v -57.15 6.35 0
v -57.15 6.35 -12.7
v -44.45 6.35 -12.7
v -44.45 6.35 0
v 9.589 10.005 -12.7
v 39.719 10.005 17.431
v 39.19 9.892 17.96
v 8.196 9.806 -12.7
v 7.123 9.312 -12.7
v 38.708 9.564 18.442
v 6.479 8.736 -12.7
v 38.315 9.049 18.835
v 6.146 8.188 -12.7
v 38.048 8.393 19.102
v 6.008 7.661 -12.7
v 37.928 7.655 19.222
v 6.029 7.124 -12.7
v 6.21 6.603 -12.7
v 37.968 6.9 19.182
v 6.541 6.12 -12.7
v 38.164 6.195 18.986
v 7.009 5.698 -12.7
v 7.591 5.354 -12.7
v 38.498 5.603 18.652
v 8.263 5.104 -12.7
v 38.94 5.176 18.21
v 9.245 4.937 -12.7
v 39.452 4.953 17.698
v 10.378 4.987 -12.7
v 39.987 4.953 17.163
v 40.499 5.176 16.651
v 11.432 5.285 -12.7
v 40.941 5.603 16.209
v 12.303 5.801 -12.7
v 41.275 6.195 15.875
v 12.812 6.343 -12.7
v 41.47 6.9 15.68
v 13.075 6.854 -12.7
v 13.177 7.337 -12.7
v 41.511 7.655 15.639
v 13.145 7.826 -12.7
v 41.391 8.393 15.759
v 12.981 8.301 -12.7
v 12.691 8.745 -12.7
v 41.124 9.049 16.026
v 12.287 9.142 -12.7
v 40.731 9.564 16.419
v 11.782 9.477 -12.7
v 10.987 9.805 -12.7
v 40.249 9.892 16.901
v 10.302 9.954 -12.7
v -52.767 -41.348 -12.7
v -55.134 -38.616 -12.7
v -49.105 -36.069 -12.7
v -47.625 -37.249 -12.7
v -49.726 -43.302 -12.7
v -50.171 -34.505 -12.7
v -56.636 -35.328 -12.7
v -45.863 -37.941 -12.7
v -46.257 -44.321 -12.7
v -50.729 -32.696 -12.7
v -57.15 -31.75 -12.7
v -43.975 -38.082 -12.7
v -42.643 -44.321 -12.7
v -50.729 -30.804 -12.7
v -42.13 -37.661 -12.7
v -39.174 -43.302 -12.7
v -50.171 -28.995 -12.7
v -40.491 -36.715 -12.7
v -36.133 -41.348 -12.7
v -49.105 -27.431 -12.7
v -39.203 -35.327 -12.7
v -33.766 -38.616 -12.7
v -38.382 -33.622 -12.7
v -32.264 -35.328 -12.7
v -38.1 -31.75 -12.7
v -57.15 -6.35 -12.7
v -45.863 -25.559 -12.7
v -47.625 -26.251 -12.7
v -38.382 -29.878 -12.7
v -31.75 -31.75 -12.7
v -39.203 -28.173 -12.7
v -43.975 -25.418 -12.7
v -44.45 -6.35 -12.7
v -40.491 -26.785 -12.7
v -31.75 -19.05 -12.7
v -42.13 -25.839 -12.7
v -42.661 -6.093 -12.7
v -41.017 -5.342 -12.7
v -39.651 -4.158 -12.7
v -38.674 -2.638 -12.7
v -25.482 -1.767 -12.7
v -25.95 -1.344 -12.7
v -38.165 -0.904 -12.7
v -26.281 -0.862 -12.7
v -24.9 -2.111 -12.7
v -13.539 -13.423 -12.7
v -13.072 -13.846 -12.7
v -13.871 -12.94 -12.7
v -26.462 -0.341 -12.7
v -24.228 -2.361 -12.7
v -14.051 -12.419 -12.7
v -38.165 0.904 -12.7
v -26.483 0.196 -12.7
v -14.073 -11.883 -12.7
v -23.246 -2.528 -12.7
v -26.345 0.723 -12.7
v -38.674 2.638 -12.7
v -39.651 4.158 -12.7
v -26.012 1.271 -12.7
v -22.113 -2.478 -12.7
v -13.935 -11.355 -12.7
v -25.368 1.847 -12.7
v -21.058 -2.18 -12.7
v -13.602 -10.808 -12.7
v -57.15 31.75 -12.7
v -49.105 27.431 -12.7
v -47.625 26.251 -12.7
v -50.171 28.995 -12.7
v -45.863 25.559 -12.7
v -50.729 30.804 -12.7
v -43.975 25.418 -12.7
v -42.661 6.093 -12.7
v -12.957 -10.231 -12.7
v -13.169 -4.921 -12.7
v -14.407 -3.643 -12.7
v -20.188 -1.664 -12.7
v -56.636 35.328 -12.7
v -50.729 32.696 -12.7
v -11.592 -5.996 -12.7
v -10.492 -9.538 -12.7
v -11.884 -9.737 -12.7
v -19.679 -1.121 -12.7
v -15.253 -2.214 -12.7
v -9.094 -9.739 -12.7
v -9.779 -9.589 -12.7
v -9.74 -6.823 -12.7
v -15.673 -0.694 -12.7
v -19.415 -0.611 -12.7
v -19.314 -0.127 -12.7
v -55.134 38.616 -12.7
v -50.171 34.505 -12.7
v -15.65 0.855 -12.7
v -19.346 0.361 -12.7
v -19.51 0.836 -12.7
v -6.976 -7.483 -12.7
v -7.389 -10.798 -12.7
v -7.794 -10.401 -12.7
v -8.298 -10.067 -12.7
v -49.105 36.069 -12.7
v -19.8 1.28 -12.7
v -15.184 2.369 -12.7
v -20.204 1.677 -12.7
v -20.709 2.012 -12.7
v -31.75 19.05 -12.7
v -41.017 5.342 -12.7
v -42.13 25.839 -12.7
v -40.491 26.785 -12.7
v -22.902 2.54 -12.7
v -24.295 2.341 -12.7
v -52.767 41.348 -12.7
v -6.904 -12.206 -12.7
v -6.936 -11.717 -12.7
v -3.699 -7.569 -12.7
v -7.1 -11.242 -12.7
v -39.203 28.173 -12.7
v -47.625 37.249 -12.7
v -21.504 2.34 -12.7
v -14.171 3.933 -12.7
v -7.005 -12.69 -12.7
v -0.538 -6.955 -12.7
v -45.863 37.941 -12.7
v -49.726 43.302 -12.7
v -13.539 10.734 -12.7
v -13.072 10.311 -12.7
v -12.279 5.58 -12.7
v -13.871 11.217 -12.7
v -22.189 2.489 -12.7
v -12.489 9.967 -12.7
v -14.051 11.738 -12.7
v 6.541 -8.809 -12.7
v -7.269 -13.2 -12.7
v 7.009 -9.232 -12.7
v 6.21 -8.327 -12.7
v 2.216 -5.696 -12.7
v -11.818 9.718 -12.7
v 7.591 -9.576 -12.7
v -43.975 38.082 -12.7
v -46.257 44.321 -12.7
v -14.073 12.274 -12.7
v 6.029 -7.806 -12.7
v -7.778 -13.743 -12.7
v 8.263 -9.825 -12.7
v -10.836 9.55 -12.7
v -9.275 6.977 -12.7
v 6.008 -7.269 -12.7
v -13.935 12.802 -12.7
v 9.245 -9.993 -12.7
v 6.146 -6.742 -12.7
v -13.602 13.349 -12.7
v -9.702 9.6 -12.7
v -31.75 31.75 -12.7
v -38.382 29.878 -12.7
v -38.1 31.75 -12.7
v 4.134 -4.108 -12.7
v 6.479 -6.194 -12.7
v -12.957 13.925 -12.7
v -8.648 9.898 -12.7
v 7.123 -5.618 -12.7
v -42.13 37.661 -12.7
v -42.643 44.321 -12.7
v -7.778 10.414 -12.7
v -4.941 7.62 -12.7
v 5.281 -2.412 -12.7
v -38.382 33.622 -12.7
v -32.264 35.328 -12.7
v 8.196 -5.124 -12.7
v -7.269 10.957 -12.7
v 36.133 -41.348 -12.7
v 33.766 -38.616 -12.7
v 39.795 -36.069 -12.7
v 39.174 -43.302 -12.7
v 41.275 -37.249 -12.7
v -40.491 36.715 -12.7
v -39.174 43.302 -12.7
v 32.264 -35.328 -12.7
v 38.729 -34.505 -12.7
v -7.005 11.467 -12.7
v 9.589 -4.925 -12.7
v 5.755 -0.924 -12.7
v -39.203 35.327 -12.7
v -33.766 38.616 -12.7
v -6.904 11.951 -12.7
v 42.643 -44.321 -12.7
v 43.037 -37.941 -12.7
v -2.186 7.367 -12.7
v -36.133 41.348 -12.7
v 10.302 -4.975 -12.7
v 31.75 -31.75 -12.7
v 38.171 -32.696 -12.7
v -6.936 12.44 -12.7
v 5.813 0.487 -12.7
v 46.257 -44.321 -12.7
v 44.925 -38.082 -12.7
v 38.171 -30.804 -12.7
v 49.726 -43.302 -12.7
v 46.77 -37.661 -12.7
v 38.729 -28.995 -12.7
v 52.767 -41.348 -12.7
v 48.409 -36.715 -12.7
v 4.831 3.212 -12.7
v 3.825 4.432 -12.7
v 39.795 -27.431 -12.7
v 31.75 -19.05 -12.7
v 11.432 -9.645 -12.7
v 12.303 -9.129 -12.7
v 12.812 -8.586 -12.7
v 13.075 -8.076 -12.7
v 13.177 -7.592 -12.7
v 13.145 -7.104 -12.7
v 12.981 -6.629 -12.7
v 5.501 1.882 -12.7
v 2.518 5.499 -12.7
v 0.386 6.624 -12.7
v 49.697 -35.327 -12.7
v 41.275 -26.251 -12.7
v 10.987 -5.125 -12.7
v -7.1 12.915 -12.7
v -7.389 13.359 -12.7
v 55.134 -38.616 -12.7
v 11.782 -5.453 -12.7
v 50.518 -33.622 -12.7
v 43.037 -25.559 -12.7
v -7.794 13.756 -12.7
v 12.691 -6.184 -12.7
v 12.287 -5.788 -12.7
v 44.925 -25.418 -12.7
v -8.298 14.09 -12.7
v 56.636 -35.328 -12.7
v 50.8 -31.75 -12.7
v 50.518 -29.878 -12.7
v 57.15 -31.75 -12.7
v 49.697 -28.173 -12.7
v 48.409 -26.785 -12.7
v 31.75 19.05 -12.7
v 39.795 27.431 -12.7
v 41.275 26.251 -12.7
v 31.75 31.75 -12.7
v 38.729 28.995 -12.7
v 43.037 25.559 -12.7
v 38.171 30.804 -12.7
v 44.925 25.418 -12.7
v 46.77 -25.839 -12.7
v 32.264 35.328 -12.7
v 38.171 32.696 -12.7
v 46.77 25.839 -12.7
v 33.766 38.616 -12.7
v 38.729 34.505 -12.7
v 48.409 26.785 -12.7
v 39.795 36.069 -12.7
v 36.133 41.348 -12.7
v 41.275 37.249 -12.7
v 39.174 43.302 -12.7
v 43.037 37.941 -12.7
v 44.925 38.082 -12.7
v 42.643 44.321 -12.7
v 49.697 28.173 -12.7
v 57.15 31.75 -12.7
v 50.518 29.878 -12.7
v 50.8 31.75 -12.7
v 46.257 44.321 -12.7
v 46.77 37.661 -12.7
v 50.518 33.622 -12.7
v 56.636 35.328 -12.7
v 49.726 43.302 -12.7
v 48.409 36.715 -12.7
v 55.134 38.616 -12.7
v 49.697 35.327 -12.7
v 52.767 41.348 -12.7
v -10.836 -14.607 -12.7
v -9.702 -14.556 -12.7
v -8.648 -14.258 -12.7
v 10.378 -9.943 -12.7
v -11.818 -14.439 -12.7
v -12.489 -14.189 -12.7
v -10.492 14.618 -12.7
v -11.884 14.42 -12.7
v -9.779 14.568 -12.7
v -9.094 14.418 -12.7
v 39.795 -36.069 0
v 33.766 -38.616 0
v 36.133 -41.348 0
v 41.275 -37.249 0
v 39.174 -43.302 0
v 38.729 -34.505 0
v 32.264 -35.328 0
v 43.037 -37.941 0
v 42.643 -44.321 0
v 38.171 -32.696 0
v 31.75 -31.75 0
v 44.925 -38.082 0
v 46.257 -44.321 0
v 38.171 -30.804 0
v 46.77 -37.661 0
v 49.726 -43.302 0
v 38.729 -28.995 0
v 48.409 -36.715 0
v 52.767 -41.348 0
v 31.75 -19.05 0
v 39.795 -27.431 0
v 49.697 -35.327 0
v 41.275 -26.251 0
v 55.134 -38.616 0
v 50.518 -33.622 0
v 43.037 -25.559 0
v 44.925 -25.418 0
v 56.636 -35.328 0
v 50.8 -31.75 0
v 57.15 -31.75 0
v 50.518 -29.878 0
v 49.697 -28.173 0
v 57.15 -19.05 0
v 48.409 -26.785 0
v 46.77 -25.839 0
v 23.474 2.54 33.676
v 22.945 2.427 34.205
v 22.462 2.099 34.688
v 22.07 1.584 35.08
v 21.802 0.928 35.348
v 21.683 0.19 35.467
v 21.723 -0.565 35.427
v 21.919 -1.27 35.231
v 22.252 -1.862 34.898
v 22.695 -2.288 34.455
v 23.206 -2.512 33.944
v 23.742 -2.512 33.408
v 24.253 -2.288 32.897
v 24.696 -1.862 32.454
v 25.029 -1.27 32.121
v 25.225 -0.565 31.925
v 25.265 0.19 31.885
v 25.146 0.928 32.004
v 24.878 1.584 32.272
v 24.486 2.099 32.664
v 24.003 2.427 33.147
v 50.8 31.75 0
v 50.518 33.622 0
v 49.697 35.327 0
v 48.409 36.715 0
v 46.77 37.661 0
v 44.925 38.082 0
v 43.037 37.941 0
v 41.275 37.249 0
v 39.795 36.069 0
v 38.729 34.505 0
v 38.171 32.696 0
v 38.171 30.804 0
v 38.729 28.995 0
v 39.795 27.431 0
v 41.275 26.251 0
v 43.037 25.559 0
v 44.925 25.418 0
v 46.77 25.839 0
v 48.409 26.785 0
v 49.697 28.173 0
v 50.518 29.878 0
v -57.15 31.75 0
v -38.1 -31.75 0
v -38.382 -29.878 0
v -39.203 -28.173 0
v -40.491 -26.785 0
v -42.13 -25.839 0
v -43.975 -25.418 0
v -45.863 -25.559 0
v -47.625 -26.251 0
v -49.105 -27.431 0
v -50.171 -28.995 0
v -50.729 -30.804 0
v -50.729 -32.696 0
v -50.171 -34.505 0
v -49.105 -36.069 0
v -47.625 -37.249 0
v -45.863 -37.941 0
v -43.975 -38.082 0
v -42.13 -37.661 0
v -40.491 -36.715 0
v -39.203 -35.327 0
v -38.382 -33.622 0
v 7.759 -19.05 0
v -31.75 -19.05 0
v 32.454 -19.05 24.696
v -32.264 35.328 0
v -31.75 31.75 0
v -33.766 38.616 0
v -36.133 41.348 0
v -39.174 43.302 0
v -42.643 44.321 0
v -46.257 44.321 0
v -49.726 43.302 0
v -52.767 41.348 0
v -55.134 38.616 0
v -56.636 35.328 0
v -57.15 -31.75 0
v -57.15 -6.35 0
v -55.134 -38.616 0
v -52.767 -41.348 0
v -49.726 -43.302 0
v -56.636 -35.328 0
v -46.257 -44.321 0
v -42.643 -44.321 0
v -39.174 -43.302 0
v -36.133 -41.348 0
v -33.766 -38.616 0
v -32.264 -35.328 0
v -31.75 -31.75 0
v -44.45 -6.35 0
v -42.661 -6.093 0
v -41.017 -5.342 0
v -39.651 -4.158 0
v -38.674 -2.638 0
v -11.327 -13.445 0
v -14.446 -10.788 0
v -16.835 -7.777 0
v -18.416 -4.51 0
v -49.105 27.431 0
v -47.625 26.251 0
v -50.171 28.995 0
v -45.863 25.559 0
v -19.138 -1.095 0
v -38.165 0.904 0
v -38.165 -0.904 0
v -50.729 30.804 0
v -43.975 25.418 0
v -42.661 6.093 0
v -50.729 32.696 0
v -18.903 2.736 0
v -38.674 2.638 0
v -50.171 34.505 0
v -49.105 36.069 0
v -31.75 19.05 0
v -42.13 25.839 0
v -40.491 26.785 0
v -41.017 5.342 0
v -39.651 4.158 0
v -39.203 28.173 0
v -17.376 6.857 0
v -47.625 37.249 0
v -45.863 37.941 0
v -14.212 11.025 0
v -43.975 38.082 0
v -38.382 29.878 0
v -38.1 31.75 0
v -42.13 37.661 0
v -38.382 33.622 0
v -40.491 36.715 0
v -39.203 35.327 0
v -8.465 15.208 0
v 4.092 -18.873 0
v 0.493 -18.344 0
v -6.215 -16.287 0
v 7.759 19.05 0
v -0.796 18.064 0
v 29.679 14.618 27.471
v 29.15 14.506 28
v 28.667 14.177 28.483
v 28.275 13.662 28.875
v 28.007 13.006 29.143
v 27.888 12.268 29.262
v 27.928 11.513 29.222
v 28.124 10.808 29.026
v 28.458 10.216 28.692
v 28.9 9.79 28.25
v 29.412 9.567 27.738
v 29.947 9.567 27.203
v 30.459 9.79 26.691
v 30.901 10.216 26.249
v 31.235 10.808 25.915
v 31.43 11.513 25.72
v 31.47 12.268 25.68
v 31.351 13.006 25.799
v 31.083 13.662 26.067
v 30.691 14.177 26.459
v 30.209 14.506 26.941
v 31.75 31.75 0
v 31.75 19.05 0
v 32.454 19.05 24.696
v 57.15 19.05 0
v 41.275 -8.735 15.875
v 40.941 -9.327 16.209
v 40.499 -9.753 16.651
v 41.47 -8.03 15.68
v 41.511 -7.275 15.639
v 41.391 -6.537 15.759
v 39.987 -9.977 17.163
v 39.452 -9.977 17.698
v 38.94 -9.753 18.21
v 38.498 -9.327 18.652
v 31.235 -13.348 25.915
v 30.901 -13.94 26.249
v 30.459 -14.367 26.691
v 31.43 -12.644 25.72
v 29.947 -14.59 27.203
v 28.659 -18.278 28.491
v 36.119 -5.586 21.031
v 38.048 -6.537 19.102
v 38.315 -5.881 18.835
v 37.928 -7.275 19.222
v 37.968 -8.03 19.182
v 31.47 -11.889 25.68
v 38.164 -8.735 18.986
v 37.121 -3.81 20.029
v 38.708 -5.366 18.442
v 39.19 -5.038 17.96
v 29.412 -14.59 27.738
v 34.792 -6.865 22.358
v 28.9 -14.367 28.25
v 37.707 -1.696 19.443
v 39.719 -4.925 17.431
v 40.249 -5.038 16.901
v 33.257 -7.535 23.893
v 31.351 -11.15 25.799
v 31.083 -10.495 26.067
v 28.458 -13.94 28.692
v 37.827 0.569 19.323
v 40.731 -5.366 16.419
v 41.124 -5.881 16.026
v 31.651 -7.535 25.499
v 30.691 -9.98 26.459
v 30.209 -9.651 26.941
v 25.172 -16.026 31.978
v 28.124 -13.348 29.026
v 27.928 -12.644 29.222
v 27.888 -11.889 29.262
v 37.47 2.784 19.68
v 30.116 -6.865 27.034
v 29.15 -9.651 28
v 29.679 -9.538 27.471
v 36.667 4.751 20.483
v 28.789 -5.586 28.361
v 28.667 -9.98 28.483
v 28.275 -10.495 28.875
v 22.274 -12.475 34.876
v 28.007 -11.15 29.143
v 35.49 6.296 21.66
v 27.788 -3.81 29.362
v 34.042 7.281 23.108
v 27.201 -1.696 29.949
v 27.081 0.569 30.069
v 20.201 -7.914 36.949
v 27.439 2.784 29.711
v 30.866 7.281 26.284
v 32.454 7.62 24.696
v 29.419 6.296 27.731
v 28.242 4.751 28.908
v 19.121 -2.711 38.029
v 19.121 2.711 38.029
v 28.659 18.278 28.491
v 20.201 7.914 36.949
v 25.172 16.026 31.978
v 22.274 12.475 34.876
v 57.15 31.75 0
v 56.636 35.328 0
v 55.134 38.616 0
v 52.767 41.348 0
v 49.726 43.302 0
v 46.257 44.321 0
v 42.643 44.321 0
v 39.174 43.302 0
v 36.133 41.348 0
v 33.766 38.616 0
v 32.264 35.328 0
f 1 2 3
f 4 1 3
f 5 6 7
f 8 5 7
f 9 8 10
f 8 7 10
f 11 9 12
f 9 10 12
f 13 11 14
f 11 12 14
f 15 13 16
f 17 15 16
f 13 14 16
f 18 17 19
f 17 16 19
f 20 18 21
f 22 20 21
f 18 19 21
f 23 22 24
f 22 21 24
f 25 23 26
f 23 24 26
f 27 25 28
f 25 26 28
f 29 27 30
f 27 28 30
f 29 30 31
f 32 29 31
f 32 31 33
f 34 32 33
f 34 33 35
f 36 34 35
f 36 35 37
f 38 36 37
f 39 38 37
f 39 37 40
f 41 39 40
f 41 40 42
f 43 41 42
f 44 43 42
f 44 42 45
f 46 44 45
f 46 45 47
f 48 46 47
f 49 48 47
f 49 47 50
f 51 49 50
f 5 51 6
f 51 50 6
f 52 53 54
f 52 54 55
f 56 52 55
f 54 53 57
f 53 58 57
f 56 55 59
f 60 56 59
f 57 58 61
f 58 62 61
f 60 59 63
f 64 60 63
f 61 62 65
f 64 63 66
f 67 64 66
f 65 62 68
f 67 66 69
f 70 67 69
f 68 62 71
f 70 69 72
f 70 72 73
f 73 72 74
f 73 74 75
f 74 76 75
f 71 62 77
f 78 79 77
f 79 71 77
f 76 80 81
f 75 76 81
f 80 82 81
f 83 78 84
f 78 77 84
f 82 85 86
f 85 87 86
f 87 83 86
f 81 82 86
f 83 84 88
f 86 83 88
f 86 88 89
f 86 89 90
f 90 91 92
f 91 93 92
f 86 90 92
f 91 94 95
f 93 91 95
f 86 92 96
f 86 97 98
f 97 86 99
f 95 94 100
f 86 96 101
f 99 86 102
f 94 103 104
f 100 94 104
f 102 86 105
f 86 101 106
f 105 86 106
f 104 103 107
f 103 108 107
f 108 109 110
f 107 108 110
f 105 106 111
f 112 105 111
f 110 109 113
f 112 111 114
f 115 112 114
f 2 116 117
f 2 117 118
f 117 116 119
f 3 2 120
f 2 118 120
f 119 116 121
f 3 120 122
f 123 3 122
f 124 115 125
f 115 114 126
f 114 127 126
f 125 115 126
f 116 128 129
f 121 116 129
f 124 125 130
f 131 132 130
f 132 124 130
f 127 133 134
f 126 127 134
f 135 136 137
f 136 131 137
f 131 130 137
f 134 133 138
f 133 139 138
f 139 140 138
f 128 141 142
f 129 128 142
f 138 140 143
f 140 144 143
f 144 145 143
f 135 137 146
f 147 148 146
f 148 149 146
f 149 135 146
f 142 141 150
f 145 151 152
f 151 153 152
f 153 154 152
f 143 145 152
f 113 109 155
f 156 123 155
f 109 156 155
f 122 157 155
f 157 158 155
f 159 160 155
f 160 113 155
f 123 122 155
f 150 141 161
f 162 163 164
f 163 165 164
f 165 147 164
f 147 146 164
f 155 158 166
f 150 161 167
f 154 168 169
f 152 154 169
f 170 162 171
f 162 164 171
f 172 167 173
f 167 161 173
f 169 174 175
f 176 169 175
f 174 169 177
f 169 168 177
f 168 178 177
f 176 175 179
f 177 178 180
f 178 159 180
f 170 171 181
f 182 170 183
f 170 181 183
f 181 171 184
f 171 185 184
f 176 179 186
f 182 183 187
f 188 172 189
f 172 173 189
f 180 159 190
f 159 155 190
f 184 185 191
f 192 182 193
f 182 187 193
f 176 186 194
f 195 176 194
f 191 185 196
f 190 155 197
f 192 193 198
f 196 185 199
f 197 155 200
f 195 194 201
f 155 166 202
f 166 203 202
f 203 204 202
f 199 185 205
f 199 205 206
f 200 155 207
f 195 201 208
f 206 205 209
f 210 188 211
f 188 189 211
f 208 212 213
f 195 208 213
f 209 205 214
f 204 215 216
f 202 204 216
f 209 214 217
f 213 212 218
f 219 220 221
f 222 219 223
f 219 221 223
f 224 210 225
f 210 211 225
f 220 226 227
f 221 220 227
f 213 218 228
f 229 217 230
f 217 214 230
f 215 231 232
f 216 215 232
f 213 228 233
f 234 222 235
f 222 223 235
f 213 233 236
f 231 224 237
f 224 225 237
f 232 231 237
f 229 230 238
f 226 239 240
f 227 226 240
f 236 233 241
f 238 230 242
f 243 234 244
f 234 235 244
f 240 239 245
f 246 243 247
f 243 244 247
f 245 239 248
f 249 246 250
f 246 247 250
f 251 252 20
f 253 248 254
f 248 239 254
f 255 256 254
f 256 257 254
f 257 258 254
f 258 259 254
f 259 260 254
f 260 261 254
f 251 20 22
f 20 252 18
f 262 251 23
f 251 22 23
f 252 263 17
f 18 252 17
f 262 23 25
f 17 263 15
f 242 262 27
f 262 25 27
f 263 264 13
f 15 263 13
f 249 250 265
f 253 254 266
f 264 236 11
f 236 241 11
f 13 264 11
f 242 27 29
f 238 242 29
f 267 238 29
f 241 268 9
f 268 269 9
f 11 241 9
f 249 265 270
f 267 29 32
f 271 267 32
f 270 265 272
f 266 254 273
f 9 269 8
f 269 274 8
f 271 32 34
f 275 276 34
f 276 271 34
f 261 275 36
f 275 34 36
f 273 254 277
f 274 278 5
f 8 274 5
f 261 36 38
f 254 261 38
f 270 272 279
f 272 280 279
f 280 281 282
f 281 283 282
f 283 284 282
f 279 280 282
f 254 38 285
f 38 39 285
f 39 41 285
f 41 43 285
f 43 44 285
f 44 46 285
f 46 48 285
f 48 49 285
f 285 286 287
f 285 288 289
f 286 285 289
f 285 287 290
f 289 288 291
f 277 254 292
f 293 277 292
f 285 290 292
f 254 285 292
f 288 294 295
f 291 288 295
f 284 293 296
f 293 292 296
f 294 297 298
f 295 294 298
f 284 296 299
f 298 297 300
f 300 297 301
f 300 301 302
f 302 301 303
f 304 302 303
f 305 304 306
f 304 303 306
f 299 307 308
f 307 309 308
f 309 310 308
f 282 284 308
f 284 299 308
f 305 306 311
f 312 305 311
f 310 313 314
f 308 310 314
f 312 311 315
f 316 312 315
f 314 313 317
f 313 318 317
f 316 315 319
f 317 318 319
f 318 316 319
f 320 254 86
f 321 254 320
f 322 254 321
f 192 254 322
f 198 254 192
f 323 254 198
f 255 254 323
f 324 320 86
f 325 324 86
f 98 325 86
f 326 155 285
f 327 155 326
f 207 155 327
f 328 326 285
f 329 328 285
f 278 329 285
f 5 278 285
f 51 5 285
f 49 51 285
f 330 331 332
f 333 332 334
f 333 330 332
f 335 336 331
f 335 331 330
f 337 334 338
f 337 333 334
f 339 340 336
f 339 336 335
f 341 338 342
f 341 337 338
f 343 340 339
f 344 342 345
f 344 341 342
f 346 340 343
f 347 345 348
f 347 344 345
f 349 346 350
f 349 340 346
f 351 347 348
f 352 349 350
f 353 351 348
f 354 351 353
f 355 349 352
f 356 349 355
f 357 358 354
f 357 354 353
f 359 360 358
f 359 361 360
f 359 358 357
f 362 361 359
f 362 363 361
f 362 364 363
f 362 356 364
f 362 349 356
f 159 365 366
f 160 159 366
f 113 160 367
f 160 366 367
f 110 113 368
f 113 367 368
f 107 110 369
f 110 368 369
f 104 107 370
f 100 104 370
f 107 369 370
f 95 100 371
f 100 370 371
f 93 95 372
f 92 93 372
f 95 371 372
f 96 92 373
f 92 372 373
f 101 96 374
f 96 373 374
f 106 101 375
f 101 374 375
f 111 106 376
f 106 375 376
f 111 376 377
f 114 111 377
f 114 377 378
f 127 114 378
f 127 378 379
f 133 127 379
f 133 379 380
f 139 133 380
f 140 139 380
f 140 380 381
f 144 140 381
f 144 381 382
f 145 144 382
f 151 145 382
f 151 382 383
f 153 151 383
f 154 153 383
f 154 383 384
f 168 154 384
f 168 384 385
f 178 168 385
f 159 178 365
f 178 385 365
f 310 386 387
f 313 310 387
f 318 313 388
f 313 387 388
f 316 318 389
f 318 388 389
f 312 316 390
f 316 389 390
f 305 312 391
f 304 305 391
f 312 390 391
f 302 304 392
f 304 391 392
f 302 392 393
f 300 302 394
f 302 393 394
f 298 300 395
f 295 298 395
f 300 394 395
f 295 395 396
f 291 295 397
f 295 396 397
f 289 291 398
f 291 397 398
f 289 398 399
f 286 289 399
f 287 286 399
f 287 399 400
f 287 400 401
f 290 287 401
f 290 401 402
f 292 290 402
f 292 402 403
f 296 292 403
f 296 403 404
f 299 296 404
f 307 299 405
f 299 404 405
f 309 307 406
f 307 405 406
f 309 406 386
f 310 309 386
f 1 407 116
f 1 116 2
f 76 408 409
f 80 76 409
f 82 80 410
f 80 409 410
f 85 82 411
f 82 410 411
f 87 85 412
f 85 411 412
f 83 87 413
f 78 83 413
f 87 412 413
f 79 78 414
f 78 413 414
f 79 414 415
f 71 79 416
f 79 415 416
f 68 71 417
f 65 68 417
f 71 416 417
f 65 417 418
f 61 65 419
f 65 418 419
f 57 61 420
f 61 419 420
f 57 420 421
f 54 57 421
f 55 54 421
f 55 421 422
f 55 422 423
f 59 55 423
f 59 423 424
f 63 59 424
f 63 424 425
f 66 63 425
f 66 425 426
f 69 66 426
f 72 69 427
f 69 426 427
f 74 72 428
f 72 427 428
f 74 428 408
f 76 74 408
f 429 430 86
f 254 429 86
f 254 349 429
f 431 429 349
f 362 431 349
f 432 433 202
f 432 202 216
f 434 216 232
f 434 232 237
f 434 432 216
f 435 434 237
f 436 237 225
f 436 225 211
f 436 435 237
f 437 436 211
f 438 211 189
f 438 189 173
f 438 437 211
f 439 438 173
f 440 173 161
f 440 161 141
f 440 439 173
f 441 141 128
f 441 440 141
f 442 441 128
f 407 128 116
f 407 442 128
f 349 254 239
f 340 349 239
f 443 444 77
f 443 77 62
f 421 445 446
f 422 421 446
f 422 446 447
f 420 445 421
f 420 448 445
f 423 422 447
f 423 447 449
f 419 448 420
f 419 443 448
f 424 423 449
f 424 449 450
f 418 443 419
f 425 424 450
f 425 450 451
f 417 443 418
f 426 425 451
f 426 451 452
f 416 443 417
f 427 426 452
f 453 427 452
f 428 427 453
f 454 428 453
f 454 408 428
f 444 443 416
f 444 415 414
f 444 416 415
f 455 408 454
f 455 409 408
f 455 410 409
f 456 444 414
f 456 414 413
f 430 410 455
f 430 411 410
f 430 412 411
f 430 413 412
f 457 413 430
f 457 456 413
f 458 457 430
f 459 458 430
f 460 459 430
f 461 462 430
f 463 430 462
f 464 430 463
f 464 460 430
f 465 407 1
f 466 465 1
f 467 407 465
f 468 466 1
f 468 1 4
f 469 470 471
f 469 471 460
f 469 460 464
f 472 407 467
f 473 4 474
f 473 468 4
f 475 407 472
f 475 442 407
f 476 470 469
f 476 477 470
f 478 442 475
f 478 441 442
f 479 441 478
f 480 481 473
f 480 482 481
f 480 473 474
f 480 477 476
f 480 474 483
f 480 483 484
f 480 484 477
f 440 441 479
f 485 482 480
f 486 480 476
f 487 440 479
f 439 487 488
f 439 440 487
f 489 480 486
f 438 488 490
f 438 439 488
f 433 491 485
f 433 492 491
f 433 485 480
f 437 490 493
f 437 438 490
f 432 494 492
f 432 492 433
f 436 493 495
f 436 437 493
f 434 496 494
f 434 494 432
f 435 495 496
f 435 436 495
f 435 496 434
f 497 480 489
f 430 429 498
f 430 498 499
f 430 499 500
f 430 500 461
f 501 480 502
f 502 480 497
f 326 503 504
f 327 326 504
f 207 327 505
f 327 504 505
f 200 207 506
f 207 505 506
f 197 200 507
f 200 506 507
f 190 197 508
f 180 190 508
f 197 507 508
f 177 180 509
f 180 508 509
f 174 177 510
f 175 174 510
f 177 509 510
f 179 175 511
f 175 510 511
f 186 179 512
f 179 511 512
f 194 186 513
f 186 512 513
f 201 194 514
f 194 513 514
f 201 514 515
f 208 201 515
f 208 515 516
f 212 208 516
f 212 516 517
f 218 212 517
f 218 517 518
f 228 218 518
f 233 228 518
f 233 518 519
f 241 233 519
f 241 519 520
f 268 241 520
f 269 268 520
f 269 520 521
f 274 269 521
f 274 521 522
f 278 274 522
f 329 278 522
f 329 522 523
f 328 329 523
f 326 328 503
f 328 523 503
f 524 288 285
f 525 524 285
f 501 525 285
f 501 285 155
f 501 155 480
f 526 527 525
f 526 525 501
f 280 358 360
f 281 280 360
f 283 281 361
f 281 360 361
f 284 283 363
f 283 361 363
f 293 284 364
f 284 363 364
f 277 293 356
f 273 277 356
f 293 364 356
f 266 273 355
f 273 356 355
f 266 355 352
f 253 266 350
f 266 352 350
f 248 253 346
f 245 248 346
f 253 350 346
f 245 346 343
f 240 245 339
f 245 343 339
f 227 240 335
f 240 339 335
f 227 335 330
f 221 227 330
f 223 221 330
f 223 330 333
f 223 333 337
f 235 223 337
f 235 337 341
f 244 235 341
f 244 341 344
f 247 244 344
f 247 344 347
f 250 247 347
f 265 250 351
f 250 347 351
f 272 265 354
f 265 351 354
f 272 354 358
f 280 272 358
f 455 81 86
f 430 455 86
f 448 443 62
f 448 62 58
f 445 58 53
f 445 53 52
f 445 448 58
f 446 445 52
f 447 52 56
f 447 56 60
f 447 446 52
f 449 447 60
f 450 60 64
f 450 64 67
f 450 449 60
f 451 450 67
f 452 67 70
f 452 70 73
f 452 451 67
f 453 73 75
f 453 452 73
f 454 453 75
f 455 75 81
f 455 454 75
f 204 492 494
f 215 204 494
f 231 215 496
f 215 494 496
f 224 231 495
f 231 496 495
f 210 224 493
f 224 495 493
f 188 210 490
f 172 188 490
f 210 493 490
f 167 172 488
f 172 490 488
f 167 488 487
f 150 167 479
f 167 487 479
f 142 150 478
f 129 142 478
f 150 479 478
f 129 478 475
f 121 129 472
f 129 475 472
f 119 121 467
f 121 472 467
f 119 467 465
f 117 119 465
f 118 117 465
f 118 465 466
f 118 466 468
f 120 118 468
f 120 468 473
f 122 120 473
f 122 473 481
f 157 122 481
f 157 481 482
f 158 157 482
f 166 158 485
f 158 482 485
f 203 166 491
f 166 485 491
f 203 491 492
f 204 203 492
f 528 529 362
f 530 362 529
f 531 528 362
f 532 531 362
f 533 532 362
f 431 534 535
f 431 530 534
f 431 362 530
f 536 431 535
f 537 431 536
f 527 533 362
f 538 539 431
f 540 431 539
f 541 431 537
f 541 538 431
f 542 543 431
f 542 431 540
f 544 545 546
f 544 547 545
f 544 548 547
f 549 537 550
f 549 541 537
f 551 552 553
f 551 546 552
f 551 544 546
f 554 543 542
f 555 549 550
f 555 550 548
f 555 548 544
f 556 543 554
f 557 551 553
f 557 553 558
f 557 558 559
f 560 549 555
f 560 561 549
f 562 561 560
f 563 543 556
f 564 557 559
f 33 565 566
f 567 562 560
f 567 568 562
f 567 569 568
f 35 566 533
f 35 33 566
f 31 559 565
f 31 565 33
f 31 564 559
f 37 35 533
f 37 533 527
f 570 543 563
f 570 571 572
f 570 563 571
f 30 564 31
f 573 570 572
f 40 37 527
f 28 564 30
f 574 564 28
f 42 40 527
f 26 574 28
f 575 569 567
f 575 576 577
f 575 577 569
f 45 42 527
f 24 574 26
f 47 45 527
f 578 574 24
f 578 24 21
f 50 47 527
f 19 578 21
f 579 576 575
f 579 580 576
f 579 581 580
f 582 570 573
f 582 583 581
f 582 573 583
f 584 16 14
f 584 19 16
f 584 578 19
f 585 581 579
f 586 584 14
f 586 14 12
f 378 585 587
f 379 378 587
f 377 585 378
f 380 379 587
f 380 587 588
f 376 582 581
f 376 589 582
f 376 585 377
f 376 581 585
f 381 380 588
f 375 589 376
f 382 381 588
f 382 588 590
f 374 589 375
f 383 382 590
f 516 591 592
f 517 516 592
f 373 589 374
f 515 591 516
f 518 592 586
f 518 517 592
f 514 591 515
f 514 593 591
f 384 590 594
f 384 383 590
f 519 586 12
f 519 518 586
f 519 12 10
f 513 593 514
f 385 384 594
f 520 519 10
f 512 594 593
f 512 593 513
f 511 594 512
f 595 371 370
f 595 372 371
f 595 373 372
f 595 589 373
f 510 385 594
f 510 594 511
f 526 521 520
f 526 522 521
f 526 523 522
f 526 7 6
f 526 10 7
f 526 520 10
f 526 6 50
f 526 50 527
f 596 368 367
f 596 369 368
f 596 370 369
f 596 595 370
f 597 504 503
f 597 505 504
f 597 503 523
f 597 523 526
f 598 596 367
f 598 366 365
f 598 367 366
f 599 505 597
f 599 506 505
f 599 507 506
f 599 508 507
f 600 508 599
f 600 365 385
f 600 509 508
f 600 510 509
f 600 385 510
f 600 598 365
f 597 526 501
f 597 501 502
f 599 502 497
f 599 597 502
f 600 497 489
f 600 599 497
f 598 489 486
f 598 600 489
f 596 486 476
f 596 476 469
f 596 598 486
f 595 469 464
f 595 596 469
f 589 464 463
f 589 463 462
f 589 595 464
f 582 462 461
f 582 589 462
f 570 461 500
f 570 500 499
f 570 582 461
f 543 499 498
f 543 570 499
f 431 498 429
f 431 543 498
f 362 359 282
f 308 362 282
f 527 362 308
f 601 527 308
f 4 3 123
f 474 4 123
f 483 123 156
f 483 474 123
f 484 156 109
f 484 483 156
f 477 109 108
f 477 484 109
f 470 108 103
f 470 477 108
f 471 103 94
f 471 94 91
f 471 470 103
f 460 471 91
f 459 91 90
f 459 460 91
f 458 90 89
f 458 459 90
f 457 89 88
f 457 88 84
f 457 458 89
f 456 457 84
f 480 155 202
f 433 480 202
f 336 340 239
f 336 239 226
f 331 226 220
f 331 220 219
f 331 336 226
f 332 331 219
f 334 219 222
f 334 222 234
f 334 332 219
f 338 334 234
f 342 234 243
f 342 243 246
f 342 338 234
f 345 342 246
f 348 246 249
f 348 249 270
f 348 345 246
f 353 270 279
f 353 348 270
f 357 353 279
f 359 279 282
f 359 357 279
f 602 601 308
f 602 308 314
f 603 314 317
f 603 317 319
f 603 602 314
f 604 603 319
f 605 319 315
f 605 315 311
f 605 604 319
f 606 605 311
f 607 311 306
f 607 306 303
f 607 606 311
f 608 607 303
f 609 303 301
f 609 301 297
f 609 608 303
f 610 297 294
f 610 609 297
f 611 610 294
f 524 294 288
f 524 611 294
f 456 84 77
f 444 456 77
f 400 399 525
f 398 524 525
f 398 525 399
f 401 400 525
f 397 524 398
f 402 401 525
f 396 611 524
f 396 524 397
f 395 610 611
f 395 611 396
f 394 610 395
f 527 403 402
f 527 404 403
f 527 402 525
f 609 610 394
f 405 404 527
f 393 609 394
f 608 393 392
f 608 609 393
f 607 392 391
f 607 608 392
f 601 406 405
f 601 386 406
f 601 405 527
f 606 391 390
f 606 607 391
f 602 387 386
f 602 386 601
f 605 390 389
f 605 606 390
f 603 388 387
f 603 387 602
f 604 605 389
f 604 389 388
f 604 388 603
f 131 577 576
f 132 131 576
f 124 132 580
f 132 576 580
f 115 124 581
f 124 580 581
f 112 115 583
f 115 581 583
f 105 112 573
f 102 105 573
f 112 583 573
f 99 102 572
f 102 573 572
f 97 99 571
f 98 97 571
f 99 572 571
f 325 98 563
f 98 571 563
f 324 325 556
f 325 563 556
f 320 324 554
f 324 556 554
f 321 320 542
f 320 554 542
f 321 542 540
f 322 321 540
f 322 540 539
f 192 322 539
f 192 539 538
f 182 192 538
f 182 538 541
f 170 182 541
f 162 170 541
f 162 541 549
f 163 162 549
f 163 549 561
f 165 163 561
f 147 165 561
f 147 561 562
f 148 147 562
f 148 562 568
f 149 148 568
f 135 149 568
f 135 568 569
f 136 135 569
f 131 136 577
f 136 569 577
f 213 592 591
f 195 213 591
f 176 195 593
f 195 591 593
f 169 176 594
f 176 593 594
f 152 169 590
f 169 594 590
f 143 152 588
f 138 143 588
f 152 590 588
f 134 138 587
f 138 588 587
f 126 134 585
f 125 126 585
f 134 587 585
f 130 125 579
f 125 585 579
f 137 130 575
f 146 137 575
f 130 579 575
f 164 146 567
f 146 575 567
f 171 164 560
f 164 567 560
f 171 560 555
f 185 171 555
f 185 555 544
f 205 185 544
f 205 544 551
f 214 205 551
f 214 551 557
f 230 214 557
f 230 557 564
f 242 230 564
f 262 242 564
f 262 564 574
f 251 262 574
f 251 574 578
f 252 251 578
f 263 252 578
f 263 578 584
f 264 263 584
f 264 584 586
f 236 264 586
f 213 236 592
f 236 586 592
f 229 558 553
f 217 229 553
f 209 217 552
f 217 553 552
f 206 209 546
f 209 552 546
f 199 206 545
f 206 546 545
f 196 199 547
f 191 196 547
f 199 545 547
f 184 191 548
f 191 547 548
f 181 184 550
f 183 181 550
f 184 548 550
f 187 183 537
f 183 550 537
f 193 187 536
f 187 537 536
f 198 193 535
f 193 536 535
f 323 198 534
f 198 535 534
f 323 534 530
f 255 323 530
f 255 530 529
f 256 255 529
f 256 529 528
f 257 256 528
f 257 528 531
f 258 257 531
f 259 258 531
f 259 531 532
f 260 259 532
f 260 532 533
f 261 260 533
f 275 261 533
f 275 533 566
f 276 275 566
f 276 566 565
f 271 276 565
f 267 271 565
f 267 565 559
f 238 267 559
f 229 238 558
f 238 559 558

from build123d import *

# Parameters (mm, degrees)
F0_R     = 6.35
F1_DEPTH = 12.7
F3_R     = 2.54
F3_R_2   = 7.62
F5_DEPTH = 89.8035612107


with BuildPart() as f1:
    # F0 (on Top) → F1 (new body)
    with BuildSketch(Plane.XY):
        with BuildLine():
            Line((-31.75, -19.05), (0, -19.05))
            Line((0, -19.05), (0, 19.05))
            Line((0, 19.05), (-31.75, 19.05))
            Line((-31.75, 19.05), (-31.75, 31.75))
            ThreePointArc((-31.75, 31.75), (-44.45, 44.45), (-57.15, 31.75))
            Line((-57.15, 31.75), (-57.15, 6.35))
            Line((-57.15, 6.35), (-44.45, 6.35))
            ThreePointArc((-44.45, 6.35), (-38.1, 0), (-44.45, -6.35))
            Line((-44.45, -6.35), (-57.15, -6.35))
            Line((-57.15, -6.35), (-57.15, -31.75))
            ThreePointArc((-57.15, -31.75), (-44.45, -44.45), (-31.75, -31.75))
            Line((-31.75, -31.75), (-31.75, -19.05))
        make_face()
        with Locations((-44.45, -31.75)):
            Circle(F0_R, mode=Mode.SUBTRACT)
        with Locations((-44.45, 31.75)):
            Circle(F0_R, mode=Mode.SUBTRACT)
        with BuildLine():
            Line((0, 19.05), (0, -19.05))
            Line((0, -19.05), (31.75, -19.05))
            Line((31.75, -19.05), (31.75, -31.75))
            ThreePointArc((31.75, -31.75), (44.45, -44.45), (57.15, -31.75))
            Line((57.15, -31.75), (57.15, 31.75))
            ThreePointArc((57.15, 31.75), (44.45, 44.45), (31.75, 31.75))
            Line((31.75, 31.75), (31.75, 19.05))
            Line((31.75, 19.05), (0, 19.05))
        make_face()
        with Locations((44.45, -31.75)):
            Circle(F0_R, mode=Mode.SUBTRACT)
        with Locations((44.45, 31.75)):
            Circle(F0_R, mode=Mode.SUBTRACT)
    extrude(amount=-F1_DEPTH)

    # F3 (on face) → F4 (join, up to the next surface of F1)
    with BuildSketch(Plane(origin=(28.575, 0, 28.575), x_dir=(0, 1, 0), z_dir=(0.7071067812, 0, 0.7071067812))):
        with BuildLine():
            Line((-19.05, -40.4111525448), (0, -40.4111525448))
            Line((0, -40.4111525448), (19.05, -40.4111525448))
            Line((19.05, -40.4111525448), (19.05, -5.4861525448))
            ThreePointArc((19.05, -5.4861525448), (0, 13.5638474552), (-19.05, -5.4861525448))
            Line((-19.05, -5.4861525448), (-19.05, -40.4111525448))
        make_face()
        with Locations((-7.4648727041, -15.7606683734)):
            Circle(F3_R, mode=Mode.SUBTRACT)
        with Locations((7.4648727041, -15.7606683734)):
            Circle(F3_R, mode=Mode.SUBTRACT)
        with Locations((-12.0784177569, -1.5616367162)):
            Circle(F3_R, mode=Mode.SUBTRACT)
        with Locations((0, -5.4861525448)):
            Circle(F3_R_2, mode=Mode.SUBTRACT)
        with Locations((12.0784177569, -1.5616367162)):
            Circle(F3_R, mode=Mode.SUBTRACT)
        with Locations((0, 7.2138474552)):
            Circle(F3_R, mode=Mode.SUBTRACT)
    extrude(until=Until.NEXT, dir=(-0.7071067812, 0, -0.7071067812))

    # F3 (on face) → F5 (cut, through all)
    with BuildSketch(Plane(origin=(28.575, 0, 28.575), x_dir=(0, 1, 0), z_dir=(0.7071067812, 0, 0.7071067812))):
        with Locations((0, 7.2138474552)):
            Circle(F3_R)
        with Locations((12.0784177569, -1.5616367162)):
            Circle(F3_R)
        with Locations((7.4648727041, -15.7606683734)):
            Circle(F3_R)
        with Locations((-7.4648727041, -15.7606683734)):
            Circle(F3_R)
        with Locations((-12.0784177569, -1.5616367162)):
            Circle(F3_R)
        with Locations((0, -5.4861525448)):
            Circle(F3_R_2)
    extrude(amount=-F5_DEPTH, mode=Mode.SUBTRACT)


solid = f1.part
